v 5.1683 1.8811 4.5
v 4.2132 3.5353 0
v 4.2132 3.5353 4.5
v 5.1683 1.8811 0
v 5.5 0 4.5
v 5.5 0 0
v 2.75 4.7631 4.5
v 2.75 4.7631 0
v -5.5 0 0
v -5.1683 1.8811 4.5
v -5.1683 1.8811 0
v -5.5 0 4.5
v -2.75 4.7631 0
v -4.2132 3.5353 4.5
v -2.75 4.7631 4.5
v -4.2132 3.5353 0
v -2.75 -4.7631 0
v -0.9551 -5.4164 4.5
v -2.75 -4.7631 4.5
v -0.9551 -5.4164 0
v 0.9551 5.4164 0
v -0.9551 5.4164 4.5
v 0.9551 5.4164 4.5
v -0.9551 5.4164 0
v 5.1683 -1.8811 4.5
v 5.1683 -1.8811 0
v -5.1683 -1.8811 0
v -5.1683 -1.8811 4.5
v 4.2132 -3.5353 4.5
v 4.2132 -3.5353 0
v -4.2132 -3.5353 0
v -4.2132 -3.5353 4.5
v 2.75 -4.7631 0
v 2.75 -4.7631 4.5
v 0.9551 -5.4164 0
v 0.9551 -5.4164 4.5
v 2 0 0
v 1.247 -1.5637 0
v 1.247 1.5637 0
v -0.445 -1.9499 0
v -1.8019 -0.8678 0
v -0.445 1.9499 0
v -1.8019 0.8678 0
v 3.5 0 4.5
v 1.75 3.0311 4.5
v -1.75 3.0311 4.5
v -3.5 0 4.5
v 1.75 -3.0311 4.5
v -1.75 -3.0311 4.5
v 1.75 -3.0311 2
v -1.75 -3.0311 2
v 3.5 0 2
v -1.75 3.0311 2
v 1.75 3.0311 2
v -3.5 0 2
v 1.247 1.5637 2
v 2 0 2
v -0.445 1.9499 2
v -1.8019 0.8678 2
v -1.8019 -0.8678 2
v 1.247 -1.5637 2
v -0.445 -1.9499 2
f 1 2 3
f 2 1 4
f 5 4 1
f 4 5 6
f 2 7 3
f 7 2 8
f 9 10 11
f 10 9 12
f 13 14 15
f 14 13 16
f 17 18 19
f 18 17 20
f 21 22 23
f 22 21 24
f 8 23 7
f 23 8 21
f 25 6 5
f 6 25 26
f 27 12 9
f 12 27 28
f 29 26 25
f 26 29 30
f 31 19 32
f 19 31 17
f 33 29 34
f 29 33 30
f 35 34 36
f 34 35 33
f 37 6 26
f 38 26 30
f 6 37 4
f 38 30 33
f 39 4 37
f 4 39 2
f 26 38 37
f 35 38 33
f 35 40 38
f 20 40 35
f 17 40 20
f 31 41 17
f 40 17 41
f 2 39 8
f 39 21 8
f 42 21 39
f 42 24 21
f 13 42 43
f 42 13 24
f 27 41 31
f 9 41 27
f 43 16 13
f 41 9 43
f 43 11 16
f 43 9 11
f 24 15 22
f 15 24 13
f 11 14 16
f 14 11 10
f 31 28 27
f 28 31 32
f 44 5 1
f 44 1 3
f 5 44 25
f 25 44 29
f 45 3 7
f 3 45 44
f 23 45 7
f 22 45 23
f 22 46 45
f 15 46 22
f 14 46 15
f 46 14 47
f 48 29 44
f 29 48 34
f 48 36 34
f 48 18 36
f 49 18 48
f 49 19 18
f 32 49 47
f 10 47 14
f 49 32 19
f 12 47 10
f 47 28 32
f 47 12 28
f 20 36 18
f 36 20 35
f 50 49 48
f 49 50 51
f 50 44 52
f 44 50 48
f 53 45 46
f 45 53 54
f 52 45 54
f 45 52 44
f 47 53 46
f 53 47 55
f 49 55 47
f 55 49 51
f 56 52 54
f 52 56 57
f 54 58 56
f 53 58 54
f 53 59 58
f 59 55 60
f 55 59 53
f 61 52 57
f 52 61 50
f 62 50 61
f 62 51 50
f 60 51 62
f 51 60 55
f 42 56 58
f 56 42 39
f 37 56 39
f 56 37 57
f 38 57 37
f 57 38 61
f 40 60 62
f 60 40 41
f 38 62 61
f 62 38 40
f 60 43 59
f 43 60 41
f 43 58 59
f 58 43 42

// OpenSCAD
// file: configure.scad
/*
 * file: configure.scad
 * author: gregor binder <gregor_reprap@catrix.at>
 * date: 10.11.2013
 * last change: 10.11.2013
 * license: CC BY-NC-SA 3.0
 */

nutheight=2.5;
nutdiagonal=7;
holediameter=4;
weeldiameter=20;
wallthickness=2;
gripcount=11;
griopheight=10;
gripradius=3;

outerdiametertestnut=14;
thicknesstestnut=2;
outerdiametertestnut=nutdiagonal+4;
// main file
/*
 * file: test-nut.scad
 * author: gregor binder <gregor_reprap@catrix.at>
 * date: 10.11.2013
 * last change: 10.11.2013
 * license: CC BY-NC-SA 3.0
 */

include <configure.scad>;

difference(){
	cylinder(h=nutheight+thicknesstestnut,r=outerdiametertestnut/2);
	translate([0,0,thicknesstestnut])
		cylinder(r = nutdiagonal/2, h=nutheight+5, $fn=6);
	translate([0,0,-0.5])
		cylinder(h=nutheight+thicknesstestnut+5,r=holediameter/2);
}
